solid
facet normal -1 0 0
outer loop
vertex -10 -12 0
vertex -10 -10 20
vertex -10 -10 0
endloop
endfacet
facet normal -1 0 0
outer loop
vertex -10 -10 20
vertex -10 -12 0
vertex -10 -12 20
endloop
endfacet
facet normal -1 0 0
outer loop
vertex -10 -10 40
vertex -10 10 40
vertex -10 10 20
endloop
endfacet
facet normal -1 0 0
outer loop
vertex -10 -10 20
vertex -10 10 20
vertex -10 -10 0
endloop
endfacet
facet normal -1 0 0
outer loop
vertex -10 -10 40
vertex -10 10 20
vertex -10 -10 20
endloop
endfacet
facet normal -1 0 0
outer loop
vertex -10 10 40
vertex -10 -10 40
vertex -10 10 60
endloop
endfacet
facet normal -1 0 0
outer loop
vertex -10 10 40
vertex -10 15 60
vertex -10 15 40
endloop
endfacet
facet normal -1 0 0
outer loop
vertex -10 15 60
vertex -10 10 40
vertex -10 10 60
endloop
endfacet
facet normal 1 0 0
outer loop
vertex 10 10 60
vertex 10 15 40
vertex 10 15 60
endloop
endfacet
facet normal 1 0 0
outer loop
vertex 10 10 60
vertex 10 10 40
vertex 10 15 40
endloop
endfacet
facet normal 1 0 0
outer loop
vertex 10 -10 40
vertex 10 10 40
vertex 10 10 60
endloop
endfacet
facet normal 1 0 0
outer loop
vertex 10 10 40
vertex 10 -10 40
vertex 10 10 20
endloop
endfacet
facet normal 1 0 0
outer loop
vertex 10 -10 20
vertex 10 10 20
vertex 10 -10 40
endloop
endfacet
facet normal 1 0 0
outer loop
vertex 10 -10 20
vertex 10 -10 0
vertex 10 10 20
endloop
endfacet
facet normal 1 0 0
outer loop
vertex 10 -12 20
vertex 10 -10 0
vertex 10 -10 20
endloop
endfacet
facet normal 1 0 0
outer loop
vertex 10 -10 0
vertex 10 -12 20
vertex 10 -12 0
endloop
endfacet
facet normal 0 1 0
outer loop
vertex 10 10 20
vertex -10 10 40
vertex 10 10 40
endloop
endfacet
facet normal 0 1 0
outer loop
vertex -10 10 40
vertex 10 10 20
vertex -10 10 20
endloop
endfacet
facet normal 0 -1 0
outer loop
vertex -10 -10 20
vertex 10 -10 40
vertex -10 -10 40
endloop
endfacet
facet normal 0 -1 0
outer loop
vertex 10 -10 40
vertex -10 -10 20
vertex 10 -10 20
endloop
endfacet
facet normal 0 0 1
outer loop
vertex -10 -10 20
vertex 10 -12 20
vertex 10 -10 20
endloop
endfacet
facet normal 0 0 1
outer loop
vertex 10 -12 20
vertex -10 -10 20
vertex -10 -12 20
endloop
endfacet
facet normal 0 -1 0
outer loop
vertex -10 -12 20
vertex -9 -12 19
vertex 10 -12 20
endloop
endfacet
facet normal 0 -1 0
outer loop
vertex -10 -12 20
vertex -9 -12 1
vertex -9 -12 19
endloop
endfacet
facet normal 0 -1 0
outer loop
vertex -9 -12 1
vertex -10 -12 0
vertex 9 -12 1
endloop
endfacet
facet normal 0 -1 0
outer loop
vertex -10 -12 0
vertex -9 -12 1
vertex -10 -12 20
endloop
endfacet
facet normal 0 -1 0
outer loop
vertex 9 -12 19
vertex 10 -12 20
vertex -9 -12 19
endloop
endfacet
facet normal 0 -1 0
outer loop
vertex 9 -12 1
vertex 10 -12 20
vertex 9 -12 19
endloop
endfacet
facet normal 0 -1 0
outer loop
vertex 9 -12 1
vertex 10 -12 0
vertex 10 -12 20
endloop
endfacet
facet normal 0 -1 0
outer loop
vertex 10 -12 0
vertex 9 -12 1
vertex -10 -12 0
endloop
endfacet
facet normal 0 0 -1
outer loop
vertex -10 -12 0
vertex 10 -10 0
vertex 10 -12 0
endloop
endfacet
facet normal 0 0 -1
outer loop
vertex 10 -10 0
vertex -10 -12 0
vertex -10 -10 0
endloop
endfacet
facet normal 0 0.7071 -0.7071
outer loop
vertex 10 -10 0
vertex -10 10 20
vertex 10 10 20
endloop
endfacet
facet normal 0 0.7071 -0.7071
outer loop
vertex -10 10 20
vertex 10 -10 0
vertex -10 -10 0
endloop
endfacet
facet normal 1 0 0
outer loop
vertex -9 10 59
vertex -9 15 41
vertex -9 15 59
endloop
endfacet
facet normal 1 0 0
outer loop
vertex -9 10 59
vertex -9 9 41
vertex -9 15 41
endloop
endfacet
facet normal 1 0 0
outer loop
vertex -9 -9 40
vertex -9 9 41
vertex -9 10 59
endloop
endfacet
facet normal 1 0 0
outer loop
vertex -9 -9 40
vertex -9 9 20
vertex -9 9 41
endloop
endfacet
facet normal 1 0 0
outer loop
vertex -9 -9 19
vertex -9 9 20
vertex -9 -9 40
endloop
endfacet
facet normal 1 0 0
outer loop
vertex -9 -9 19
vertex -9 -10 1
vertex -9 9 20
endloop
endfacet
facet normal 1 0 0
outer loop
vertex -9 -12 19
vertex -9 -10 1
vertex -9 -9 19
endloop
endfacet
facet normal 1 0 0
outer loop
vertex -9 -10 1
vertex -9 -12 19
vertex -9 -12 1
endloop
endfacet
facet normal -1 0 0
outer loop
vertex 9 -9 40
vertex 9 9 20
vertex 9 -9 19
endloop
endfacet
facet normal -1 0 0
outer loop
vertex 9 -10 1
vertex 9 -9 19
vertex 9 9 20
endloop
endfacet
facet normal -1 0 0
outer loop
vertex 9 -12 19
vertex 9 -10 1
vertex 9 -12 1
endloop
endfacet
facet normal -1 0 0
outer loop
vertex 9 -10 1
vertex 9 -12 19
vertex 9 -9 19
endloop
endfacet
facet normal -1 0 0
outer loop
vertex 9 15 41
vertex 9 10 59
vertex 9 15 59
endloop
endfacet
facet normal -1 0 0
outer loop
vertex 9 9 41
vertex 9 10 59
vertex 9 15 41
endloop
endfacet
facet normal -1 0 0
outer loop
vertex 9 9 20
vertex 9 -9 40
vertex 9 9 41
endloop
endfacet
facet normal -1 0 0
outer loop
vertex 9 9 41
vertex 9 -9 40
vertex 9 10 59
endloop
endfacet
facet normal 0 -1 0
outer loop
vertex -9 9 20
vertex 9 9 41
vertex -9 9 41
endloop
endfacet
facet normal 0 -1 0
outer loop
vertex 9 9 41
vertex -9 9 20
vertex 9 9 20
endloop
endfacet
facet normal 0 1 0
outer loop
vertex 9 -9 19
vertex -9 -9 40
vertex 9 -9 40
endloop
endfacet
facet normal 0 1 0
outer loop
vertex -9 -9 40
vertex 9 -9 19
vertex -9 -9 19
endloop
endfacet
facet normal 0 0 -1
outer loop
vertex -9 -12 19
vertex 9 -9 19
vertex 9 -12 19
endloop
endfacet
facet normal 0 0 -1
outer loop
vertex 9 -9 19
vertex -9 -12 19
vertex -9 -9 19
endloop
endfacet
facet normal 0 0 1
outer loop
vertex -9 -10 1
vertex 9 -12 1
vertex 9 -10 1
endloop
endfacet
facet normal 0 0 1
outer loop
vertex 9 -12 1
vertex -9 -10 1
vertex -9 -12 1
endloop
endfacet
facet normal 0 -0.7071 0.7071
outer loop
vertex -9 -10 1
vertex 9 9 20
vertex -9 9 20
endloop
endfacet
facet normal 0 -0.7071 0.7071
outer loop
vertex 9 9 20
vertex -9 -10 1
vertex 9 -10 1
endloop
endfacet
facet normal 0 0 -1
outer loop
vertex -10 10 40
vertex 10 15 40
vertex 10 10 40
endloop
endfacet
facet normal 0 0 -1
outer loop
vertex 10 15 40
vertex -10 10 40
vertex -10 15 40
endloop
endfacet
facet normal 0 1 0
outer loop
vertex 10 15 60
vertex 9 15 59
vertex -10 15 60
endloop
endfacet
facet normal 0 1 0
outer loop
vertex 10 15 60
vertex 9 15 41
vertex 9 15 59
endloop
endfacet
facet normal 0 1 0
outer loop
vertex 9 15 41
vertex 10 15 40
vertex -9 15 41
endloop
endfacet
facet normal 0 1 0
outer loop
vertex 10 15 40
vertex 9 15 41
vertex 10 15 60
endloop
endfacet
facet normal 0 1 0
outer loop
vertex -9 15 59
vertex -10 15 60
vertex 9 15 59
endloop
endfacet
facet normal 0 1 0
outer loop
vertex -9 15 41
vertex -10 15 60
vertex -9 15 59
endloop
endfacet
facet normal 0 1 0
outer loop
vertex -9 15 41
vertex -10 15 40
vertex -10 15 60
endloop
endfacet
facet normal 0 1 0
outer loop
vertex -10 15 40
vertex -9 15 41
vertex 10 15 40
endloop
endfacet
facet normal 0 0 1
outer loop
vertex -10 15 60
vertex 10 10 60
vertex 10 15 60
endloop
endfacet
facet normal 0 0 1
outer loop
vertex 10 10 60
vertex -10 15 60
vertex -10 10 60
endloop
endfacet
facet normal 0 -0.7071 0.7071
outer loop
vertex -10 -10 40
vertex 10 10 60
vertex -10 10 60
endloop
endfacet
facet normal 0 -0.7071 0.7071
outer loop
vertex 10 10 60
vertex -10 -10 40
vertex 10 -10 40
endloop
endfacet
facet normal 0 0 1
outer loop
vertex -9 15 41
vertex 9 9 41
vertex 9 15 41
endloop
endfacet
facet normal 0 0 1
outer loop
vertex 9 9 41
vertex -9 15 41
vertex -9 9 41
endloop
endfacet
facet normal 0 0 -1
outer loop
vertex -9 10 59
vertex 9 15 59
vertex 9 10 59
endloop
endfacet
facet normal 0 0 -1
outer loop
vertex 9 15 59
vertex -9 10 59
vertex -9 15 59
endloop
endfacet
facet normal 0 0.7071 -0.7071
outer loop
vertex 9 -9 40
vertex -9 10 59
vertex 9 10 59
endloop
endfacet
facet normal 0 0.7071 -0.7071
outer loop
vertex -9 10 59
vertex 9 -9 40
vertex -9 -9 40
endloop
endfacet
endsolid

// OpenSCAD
// file: periscope_knee.scad
diameter = 10;
horizontal_leg = 3;
vertical_leg = 7;
wall_thickness = 0.5;

module periscope_knee(d=diameter, h=horizontal_leg, v=vertical_leg, w=wall_thickness) {
  translate([-d/2,-(h+d/2),-d-v])
    rotate([90,0,90])
        difference(){
            linear_extrude(d)
                polygon([[0,0], [h,0], [d+h,d], [d+h,d+v],[h,d+v],[h,d],[0,d]]);
            translate([0,0,w])
                linear_extrude(d-w-w)
                    polygon([[-w,w], [h,w], [d+h-w,d], [d+h-w,d+v+w],[h+w,d+v+w],[h+w,d-w],[-w,d-w]]);
    }  
}

periscope_knee();
// main file
diameter=20;
top_hl=5;
bottom_hl=2;
height=60;
wall_thickness=1;
twist=180;

use <periscope_knee.scad>

module periscope(d=diameter,th=top_hl,bh=bottom_hl,h=height,w=wall_thickness,t=twist) {
    translate([0,0,h/2])
    union() {
        periscope_knee(d,bh,(h/2)-d,w);
        translate([0,0,-w])
            rotate([0,180,t])
                periscope_knee(d,th,((h/2)-d)+w,w);
    }
}

periscope();
